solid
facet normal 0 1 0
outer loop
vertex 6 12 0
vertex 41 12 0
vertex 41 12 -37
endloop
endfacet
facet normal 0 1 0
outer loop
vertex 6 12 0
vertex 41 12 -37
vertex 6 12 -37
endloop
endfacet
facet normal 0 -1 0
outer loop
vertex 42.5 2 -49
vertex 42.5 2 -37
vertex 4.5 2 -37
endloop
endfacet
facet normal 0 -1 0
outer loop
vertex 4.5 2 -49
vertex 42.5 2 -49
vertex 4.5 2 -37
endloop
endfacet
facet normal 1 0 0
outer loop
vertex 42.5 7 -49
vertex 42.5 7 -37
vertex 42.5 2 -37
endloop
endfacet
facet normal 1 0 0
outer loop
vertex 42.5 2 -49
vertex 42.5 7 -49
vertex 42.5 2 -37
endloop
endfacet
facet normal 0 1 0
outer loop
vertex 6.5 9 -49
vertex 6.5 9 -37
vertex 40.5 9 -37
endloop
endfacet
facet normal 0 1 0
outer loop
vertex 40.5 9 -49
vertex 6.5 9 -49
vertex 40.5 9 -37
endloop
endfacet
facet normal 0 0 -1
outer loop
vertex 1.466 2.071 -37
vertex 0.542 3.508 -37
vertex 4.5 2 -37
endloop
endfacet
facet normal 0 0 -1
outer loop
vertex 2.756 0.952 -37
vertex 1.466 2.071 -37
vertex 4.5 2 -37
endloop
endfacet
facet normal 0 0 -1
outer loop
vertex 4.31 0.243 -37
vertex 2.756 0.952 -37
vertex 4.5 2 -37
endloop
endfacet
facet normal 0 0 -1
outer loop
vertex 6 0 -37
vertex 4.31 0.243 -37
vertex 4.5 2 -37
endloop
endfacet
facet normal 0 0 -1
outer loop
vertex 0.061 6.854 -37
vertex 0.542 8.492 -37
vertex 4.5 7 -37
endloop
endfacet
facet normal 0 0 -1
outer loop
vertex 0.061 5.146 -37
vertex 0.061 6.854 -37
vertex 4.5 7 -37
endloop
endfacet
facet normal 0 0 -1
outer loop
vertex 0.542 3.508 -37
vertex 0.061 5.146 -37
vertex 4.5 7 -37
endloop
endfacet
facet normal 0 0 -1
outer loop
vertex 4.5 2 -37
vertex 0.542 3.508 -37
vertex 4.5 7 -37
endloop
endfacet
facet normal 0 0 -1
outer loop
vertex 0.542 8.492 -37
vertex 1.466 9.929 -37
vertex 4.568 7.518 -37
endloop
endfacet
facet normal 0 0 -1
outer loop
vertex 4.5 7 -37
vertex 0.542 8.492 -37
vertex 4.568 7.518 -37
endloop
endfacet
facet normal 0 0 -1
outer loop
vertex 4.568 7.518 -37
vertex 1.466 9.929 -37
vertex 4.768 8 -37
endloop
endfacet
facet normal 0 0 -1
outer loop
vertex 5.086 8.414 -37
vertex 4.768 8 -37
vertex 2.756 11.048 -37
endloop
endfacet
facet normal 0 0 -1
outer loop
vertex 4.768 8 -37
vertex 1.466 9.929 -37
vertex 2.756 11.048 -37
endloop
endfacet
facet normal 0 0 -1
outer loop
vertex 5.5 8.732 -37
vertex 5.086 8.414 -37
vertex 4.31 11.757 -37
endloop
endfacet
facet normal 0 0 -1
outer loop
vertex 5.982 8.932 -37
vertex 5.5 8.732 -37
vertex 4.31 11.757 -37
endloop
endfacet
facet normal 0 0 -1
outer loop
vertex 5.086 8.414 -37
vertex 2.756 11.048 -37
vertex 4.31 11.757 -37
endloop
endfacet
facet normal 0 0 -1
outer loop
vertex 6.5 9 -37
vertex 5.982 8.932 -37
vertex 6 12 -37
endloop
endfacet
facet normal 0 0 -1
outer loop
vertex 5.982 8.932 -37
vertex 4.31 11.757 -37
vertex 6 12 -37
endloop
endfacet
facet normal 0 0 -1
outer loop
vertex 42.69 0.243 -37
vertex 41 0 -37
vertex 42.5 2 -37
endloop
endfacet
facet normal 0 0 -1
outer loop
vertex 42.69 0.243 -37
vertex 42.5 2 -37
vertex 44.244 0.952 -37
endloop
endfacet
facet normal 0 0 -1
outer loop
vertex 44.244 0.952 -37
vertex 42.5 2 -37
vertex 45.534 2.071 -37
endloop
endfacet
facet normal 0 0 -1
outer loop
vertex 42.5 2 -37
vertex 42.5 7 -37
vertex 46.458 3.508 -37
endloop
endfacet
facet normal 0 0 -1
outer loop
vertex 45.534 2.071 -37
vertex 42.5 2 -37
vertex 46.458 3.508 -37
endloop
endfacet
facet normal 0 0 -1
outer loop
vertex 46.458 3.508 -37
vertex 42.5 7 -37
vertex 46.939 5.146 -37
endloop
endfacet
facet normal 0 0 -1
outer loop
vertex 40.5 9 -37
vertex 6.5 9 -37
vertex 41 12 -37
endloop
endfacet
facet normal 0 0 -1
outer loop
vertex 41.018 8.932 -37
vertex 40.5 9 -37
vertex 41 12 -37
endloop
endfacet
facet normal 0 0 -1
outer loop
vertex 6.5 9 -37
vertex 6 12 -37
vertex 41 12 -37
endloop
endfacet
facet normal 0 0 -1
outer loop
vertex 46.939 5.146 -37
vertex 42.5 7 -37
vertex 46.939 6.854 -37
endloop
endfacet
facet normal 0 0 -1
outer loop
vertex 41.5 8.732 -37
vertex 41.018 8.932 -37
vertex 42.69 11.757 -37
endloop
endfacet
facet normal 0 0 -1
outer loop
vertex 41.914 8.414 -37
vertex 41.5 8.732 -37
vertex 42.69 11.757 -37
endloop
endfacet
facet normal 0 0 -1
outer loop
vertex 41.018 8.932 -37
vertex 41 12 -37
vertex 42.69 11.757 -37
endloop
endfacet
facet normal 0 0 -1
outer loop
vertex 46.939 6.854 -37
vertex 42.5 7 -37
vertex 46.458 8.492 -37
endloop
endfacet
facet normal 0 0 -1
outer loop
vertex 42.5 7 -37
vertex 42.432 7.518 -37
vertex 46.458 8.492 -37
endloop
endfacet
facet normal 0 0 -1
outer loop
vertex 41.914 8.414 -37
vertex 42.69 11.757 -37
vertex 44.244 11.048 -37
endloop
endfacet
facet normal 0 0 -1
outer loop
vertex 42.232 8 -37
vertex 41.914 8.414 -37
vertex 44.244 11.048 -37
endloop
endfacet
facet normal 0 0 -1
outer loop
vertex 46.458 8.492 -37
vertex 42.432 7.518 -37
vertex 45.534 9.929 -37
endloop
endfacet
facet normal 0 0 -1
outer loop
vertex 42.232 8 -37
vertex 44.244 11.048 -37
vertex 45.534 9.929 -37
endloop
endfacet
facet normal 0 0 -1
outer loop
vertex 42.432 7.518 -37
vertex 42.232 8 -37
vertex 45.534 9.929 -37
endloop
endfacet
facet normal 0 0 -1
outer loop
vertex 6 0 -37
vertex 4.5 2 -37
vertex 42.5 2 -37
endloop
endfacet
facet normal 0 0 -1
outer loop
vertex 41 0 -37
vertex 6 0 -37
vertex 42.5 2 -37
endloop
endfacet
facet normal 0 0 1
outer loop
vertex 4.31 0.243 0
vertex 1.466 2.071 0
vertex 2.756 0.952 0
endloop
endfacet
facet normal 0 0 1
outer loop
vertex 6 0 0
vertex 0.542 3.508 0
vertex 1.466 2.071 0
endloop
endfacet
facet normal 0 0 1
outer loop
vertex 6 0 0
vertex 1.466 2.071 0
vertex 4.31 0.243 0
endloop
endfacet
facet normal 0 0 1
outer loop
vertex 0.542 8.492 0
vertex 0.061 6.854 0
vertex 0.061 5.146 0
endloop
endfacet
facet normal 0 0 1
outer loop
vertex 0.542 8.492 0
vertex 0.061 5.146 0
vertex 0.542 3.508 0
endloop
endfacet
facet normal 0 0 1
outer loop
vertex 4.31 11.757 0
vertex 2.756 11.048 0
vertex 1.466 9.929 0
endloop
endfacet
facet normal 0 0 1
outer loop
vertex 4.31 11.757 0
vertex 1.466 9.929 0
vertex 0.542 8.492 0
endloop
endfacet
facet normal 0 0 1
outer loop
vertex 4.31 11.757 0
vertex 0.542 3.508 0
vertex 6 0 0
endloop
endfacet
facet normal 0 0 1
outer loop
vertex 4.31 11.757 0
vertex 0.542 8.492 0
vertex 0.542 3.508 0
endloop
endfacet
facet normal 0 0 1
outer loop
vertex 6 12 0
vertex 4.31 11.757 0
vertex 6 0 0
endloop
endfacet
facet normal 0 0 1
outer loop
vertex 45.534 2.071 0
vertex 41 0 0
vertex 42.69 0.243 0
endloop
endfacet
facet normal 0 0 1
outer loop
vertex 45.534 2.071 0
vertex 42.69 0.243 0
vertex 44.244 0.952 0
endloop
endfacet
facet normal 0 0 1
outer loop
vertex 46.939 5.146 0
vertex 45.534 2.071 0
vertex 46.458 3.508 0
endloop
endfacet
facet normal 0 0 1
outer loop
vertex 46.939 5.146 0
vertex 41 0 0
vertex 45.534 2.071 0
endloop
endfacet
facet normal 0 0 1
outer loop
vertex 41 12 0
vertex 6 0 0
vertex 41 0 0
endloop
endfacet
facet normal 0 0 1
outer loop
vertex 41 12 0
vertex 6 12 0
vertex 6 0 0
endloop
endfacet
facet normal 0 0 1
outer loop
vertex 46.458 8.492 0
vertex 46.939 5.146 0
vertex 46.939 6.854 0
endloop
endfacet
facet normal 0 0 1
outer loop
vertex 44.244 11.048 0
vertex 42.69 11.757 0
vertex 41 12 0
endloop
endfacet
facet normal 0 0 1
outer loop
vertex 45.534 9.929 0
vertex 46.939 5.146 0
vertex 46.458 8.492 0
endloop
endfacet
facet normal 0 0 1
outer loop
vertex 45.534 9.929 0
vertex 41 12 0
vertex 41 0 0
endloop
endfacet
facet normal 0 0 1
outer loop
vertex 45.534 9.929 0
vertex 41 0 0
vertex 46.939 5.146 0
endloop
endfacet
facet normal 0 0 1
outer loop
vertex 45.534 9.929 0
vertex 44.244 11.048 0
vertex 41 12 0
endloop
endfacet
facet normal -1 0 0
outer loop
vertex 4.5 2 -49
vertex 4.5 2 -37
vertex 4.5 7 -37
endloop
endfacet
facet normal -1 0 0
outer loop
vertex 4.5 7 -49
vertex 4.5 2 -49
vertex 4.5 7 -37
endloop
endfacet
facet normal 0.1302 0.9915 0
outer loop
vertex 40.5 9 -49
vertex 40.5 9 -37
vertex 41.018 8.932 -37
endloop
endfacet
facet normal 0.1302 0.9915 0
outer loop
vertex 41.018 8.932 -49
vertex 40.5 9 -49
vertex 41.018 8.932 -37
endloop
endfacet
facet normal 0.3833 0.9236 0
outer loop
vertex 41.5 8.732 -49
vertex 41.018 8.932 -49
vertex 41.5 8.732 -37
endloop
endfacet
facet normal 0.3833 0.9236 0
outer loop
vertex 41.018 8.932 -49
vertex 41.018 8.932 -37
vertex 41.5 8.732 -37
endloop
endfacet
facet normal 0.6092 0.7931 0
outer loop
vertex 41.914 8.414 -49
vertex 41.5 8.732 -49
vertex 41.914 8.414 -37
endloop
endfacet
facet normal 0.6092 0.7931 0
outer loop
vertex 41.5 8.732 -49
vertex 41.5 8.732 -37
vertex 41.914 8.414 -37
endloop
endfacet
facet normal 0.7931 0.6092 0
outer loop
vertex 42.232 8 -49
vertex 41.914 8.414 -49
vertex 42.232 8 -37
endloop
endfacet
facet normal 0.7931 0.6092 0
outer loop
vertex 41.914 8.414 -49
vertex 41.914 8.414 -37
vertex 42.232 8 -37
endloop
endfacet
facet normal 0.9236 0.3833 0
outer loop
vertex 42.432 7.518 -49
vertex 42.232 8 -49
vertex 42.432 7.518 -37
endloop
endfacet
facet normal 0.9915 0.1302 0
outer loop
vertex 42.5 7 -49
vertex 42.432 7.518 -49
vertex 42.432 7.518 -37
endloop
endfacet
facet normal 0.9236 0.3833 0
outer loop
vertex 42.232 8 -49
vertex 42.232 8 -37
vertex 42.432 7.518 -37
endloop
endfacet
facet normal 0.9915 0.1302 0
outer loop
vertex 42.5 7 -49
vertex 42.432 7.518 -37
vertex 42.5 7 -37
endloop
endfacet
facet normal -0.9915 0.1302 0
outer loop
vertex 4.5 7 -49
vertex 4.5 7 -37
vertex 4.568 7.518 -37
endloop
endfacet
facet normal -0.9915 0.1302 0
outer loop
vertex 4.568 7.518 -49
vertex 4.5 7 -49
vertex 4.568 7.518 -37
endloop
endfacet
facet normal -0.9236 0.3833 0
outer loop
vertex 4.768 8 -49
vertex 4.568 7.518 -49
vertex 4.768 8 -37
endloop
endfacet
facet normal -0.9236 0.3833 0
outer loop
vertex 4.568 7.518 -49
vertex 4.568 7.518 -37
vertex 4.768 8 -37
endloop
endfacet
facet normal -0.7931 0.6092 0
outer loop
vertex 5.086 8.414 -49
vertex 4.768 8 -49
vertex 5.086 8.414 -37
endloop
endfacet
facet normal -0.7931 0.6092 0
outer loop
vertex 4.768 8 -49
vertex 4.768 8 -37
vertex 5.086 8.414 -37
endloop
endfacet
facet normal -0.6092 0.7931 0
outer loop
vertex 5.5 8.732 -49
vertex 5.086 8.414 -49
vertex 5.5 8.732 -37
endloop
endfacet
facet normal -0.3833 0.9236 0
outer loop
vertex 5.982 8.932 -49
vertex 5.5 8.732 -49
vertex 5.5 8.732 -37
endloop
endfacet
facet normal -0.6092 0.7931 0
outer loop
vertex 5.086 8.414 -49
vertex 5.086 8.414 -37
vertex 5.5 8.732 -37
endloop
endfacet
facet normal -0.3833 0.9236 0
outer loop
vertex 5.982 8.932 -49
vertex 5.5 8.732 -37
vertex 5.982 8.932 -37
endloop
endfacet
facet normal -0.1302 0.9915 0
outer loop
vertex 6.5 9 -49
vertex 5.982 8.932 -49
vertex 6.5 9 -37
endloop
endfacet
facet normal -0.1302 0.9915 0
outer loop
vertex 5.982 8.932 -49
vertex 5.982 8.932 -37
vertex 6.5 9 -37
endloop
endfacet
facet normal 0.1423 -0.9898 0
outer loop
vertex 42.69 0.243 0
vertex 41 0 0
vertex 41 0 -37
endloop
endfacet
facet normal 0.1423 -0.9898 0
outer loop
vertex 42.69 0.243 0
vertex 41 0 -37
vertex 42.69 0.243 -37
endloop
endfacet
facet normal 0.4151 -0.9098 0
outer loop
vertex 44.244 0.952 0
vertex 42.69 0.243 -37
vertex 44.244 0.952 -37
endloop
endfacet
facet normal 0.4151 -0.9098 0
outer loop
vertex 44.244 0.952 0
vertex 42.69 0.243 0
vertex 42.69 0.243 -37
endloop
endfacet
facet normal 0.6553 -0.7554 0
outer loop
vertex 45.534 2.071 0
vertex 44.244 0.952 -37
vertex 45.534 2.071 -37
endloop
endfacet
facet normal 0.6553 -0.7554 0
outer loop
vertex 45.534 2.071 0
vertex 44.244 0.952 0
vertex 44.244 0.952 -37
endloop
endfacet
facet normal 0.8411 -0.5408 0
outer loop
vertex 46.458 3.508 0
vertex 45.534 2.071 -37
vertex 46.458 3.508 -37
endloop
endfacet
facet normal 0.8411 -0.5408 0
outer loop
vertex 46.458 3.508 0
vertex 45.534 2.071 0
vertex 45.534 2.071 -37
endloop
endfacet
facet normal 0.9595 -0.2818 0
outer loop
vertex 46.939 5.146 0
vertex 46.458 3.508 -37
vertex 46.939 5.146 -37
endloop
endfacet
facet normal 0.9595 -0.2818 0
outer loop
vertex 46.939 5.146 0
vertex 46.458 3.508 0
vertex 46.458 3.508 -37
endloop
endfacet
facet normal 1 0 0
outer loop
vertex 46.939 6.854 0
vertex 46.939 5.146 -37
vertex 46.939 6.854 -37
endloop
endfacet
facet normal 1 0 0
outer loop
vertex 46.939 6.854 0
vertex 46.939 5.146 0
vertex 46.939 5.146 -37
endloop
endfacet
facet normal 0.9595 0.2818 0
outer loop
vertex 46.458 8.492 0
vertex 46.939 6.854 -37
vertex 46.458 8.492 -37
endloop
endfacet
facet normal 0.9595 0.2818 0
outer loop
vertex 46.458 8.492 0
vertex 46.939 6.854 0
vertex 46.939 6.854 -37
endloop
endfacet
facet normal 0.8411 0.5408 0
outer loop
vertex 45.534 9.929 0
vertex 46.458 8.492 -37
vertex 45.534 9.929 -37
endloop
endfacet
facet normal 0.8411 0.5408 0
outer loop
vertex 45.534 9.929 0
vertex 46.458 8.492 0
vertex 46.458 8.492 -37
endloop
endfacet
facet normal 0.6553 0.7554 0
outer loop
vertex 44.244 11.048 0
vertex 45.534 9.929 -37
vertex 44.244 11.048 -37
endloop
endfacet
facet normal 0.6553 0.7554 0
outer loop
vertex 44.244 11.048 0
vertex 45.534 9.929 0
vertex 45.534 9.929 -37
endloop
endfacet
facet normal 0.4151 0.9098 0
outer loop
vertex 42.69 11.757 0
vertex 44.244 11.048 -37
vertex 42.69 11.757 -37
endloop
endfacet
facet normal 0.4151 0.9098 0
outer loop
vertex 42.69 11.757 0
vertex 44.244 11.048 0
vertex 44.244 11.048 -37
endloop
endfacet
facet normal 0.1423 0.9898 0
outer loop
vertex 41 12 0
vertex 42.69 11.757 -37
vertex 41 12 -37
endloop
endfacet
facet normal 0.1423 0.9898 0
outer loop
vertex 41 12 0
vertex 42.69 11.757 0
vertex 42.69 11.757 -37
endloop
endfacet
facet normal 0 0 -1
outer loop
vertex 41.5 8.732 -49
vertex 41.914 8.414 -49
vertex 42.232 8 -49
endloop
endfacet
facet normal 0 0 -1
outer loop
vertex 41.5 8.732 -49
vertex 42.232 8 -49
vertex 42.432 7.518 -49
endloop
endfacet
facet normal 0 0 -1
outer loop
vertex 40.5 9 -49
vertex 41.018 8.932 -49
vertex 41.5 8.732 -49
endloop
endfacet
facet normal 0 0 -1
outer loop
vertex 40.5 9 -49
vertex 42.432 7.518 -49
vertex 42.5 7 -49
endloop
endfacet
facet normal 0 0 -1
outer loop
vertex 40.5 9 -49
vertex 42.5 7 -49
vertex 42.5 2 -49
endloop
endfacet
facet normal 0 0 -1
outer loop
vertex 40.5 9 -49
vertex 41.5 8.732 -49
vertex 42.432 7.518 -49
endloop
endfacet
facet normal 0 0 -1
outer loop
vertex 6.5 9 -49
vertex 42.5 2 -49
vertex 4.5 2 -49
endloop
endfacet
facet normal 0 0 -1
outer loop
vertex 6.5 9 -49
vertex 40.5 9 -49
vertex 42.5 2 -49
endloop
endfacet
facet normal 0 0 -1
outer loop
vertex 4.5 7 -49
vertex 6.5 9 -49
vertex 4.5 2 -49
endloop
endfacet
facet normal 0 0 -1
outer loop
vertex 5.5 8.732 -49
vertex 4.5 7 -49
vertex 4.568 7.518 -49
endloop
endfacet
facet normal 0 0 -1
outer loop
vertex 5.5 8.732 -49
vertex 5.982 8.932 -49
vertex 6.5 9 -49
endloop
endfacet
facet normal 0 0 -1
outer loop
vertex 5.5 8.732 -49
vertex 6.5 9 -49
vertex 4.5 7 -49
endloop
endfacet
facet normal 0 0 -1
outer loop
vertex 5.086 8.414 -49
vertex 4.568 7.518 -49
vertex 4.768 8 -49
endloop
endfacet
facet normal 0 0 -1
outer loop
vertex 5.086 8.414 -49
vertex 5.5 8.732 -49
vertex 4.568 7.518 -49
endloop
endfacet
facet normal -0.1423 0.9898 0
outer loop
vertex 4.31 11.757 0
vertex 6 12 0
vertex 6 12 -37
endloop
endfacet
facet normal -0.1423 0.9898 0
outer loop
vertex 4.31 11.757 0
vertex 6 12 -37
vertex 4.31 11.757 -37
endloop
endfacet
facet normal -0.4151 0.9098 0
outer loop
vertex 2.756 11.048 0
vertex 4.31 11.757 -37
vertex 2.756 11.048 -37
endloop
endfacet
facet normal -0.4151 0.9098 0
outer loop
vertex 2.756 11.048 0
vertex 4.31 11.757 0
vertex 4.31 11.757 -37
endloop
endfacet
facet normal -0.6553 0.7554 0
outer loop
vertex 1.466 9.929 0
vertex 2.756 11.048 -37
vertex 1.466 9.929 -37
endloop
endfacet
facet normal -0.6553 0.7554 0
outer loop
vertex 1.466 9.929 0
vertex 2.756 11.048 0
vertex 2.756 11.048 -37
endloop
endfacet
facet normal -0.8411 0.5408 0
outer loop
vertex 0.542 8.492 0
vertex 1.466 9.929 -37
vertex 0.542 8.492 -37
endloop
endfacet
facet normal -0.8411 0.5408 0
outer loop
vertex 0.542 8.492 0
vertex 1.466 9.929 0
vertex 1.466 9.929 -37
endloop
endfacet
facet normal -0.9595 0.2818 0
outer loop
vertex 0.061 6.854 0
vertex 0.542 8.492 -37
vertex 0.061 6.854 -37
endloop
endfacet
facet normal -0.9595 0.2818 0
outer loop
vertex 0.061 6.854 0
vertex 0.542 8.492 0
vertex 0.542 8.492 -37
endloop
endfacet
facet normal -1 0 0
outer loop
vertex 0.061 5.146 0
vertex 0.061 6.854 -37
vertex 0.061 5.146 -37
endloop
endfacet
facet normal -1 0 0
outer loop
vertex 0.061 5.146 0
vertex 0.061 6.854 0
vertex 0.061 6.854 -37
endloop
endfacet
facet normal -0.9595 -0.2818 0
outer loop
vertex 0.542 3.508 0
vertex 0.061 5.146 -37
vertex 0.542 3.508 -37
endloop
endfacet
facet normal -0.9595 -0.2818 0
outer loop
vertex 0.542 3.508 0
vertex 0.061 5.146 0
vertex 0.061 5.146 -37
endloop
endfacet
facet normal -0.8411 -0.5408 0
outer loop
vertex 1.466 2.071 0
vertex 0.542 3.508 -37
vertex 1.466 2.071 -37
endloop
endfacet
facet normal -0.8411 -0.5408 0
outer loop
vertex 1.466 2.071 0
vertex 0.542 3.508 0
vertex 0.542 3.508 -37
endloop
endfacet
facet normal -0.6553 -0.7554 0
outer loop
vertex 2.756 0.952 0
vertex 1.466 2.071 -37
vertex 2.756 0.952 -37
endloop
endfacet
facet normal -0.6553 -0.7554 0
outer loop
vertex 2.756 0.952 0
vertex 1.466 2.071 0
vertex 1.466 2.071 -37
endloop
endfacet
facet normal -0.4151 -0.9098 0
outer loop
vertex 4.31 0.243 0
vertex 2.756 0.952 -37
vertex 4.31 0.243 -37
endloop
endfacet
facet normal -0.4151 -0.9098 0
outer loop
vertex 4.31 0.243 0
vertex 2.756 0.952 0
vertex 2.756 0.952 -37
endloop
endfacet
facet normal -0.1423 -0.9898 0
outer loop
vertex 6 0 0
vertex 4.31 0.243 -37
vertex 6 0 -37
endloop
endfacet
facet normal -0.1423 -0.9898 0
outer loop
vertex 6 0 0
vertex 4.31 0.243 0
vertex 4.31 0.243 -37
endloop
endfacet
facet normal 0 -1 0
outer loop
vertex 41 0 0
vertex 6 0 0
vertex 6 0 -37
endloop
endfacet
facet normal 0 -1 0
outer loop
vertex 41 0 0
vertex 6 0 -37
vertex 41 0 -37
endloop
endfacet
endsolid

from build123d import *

# Parameters (mm, degrees)
BOSS_EXTRUDE2_DEPTH = 37
BOSS_EXTRUDE3_DEPTH = 12


with BuildPart() as part:
    # Sketch1 → Boss-Extrude2 (new body)
    with BuildSketch(Plane.XY):
        with BuildLine():
            Line((6, 0), (41, 0))
            ThreePointArc((41, 0), (47, 6), (41, 12))
            Line((41, 12), (6, 12))
            ThreePointArc((6, 12), (0, 6), (6, 0))
        make_face()
    extrude(amount=-BOSS_EXTRUDE2_DEPTH)

    # Sketch2 → Boss-Extrude3 (add)
    with BuildSketch(Plane(origin=(0, 0, -37), x_dir=(-1, 0, 0), z_dir=(0, 0, -1))):
        with BuildLine():
            Line((-42.5, 2), (-4.5, 2))
            Line((-4.5, 2), (-4.5, 7))
            ThreePointArc((-4.5, 7), (-5.085786438, 8.414213562), (-6.5, 9))
            Line((-6.5, 9), (-40.5, 9))
            ThreePointArc((-40.5, 9), (-41.914213562, 8.414213562), (-42.5, 7))
            Line((-42.5, 7), (-42.5, 2))
        make_face()
    extrude(amount=BOSS_EXTRUDE3_DEPTH)


solid = part.part
